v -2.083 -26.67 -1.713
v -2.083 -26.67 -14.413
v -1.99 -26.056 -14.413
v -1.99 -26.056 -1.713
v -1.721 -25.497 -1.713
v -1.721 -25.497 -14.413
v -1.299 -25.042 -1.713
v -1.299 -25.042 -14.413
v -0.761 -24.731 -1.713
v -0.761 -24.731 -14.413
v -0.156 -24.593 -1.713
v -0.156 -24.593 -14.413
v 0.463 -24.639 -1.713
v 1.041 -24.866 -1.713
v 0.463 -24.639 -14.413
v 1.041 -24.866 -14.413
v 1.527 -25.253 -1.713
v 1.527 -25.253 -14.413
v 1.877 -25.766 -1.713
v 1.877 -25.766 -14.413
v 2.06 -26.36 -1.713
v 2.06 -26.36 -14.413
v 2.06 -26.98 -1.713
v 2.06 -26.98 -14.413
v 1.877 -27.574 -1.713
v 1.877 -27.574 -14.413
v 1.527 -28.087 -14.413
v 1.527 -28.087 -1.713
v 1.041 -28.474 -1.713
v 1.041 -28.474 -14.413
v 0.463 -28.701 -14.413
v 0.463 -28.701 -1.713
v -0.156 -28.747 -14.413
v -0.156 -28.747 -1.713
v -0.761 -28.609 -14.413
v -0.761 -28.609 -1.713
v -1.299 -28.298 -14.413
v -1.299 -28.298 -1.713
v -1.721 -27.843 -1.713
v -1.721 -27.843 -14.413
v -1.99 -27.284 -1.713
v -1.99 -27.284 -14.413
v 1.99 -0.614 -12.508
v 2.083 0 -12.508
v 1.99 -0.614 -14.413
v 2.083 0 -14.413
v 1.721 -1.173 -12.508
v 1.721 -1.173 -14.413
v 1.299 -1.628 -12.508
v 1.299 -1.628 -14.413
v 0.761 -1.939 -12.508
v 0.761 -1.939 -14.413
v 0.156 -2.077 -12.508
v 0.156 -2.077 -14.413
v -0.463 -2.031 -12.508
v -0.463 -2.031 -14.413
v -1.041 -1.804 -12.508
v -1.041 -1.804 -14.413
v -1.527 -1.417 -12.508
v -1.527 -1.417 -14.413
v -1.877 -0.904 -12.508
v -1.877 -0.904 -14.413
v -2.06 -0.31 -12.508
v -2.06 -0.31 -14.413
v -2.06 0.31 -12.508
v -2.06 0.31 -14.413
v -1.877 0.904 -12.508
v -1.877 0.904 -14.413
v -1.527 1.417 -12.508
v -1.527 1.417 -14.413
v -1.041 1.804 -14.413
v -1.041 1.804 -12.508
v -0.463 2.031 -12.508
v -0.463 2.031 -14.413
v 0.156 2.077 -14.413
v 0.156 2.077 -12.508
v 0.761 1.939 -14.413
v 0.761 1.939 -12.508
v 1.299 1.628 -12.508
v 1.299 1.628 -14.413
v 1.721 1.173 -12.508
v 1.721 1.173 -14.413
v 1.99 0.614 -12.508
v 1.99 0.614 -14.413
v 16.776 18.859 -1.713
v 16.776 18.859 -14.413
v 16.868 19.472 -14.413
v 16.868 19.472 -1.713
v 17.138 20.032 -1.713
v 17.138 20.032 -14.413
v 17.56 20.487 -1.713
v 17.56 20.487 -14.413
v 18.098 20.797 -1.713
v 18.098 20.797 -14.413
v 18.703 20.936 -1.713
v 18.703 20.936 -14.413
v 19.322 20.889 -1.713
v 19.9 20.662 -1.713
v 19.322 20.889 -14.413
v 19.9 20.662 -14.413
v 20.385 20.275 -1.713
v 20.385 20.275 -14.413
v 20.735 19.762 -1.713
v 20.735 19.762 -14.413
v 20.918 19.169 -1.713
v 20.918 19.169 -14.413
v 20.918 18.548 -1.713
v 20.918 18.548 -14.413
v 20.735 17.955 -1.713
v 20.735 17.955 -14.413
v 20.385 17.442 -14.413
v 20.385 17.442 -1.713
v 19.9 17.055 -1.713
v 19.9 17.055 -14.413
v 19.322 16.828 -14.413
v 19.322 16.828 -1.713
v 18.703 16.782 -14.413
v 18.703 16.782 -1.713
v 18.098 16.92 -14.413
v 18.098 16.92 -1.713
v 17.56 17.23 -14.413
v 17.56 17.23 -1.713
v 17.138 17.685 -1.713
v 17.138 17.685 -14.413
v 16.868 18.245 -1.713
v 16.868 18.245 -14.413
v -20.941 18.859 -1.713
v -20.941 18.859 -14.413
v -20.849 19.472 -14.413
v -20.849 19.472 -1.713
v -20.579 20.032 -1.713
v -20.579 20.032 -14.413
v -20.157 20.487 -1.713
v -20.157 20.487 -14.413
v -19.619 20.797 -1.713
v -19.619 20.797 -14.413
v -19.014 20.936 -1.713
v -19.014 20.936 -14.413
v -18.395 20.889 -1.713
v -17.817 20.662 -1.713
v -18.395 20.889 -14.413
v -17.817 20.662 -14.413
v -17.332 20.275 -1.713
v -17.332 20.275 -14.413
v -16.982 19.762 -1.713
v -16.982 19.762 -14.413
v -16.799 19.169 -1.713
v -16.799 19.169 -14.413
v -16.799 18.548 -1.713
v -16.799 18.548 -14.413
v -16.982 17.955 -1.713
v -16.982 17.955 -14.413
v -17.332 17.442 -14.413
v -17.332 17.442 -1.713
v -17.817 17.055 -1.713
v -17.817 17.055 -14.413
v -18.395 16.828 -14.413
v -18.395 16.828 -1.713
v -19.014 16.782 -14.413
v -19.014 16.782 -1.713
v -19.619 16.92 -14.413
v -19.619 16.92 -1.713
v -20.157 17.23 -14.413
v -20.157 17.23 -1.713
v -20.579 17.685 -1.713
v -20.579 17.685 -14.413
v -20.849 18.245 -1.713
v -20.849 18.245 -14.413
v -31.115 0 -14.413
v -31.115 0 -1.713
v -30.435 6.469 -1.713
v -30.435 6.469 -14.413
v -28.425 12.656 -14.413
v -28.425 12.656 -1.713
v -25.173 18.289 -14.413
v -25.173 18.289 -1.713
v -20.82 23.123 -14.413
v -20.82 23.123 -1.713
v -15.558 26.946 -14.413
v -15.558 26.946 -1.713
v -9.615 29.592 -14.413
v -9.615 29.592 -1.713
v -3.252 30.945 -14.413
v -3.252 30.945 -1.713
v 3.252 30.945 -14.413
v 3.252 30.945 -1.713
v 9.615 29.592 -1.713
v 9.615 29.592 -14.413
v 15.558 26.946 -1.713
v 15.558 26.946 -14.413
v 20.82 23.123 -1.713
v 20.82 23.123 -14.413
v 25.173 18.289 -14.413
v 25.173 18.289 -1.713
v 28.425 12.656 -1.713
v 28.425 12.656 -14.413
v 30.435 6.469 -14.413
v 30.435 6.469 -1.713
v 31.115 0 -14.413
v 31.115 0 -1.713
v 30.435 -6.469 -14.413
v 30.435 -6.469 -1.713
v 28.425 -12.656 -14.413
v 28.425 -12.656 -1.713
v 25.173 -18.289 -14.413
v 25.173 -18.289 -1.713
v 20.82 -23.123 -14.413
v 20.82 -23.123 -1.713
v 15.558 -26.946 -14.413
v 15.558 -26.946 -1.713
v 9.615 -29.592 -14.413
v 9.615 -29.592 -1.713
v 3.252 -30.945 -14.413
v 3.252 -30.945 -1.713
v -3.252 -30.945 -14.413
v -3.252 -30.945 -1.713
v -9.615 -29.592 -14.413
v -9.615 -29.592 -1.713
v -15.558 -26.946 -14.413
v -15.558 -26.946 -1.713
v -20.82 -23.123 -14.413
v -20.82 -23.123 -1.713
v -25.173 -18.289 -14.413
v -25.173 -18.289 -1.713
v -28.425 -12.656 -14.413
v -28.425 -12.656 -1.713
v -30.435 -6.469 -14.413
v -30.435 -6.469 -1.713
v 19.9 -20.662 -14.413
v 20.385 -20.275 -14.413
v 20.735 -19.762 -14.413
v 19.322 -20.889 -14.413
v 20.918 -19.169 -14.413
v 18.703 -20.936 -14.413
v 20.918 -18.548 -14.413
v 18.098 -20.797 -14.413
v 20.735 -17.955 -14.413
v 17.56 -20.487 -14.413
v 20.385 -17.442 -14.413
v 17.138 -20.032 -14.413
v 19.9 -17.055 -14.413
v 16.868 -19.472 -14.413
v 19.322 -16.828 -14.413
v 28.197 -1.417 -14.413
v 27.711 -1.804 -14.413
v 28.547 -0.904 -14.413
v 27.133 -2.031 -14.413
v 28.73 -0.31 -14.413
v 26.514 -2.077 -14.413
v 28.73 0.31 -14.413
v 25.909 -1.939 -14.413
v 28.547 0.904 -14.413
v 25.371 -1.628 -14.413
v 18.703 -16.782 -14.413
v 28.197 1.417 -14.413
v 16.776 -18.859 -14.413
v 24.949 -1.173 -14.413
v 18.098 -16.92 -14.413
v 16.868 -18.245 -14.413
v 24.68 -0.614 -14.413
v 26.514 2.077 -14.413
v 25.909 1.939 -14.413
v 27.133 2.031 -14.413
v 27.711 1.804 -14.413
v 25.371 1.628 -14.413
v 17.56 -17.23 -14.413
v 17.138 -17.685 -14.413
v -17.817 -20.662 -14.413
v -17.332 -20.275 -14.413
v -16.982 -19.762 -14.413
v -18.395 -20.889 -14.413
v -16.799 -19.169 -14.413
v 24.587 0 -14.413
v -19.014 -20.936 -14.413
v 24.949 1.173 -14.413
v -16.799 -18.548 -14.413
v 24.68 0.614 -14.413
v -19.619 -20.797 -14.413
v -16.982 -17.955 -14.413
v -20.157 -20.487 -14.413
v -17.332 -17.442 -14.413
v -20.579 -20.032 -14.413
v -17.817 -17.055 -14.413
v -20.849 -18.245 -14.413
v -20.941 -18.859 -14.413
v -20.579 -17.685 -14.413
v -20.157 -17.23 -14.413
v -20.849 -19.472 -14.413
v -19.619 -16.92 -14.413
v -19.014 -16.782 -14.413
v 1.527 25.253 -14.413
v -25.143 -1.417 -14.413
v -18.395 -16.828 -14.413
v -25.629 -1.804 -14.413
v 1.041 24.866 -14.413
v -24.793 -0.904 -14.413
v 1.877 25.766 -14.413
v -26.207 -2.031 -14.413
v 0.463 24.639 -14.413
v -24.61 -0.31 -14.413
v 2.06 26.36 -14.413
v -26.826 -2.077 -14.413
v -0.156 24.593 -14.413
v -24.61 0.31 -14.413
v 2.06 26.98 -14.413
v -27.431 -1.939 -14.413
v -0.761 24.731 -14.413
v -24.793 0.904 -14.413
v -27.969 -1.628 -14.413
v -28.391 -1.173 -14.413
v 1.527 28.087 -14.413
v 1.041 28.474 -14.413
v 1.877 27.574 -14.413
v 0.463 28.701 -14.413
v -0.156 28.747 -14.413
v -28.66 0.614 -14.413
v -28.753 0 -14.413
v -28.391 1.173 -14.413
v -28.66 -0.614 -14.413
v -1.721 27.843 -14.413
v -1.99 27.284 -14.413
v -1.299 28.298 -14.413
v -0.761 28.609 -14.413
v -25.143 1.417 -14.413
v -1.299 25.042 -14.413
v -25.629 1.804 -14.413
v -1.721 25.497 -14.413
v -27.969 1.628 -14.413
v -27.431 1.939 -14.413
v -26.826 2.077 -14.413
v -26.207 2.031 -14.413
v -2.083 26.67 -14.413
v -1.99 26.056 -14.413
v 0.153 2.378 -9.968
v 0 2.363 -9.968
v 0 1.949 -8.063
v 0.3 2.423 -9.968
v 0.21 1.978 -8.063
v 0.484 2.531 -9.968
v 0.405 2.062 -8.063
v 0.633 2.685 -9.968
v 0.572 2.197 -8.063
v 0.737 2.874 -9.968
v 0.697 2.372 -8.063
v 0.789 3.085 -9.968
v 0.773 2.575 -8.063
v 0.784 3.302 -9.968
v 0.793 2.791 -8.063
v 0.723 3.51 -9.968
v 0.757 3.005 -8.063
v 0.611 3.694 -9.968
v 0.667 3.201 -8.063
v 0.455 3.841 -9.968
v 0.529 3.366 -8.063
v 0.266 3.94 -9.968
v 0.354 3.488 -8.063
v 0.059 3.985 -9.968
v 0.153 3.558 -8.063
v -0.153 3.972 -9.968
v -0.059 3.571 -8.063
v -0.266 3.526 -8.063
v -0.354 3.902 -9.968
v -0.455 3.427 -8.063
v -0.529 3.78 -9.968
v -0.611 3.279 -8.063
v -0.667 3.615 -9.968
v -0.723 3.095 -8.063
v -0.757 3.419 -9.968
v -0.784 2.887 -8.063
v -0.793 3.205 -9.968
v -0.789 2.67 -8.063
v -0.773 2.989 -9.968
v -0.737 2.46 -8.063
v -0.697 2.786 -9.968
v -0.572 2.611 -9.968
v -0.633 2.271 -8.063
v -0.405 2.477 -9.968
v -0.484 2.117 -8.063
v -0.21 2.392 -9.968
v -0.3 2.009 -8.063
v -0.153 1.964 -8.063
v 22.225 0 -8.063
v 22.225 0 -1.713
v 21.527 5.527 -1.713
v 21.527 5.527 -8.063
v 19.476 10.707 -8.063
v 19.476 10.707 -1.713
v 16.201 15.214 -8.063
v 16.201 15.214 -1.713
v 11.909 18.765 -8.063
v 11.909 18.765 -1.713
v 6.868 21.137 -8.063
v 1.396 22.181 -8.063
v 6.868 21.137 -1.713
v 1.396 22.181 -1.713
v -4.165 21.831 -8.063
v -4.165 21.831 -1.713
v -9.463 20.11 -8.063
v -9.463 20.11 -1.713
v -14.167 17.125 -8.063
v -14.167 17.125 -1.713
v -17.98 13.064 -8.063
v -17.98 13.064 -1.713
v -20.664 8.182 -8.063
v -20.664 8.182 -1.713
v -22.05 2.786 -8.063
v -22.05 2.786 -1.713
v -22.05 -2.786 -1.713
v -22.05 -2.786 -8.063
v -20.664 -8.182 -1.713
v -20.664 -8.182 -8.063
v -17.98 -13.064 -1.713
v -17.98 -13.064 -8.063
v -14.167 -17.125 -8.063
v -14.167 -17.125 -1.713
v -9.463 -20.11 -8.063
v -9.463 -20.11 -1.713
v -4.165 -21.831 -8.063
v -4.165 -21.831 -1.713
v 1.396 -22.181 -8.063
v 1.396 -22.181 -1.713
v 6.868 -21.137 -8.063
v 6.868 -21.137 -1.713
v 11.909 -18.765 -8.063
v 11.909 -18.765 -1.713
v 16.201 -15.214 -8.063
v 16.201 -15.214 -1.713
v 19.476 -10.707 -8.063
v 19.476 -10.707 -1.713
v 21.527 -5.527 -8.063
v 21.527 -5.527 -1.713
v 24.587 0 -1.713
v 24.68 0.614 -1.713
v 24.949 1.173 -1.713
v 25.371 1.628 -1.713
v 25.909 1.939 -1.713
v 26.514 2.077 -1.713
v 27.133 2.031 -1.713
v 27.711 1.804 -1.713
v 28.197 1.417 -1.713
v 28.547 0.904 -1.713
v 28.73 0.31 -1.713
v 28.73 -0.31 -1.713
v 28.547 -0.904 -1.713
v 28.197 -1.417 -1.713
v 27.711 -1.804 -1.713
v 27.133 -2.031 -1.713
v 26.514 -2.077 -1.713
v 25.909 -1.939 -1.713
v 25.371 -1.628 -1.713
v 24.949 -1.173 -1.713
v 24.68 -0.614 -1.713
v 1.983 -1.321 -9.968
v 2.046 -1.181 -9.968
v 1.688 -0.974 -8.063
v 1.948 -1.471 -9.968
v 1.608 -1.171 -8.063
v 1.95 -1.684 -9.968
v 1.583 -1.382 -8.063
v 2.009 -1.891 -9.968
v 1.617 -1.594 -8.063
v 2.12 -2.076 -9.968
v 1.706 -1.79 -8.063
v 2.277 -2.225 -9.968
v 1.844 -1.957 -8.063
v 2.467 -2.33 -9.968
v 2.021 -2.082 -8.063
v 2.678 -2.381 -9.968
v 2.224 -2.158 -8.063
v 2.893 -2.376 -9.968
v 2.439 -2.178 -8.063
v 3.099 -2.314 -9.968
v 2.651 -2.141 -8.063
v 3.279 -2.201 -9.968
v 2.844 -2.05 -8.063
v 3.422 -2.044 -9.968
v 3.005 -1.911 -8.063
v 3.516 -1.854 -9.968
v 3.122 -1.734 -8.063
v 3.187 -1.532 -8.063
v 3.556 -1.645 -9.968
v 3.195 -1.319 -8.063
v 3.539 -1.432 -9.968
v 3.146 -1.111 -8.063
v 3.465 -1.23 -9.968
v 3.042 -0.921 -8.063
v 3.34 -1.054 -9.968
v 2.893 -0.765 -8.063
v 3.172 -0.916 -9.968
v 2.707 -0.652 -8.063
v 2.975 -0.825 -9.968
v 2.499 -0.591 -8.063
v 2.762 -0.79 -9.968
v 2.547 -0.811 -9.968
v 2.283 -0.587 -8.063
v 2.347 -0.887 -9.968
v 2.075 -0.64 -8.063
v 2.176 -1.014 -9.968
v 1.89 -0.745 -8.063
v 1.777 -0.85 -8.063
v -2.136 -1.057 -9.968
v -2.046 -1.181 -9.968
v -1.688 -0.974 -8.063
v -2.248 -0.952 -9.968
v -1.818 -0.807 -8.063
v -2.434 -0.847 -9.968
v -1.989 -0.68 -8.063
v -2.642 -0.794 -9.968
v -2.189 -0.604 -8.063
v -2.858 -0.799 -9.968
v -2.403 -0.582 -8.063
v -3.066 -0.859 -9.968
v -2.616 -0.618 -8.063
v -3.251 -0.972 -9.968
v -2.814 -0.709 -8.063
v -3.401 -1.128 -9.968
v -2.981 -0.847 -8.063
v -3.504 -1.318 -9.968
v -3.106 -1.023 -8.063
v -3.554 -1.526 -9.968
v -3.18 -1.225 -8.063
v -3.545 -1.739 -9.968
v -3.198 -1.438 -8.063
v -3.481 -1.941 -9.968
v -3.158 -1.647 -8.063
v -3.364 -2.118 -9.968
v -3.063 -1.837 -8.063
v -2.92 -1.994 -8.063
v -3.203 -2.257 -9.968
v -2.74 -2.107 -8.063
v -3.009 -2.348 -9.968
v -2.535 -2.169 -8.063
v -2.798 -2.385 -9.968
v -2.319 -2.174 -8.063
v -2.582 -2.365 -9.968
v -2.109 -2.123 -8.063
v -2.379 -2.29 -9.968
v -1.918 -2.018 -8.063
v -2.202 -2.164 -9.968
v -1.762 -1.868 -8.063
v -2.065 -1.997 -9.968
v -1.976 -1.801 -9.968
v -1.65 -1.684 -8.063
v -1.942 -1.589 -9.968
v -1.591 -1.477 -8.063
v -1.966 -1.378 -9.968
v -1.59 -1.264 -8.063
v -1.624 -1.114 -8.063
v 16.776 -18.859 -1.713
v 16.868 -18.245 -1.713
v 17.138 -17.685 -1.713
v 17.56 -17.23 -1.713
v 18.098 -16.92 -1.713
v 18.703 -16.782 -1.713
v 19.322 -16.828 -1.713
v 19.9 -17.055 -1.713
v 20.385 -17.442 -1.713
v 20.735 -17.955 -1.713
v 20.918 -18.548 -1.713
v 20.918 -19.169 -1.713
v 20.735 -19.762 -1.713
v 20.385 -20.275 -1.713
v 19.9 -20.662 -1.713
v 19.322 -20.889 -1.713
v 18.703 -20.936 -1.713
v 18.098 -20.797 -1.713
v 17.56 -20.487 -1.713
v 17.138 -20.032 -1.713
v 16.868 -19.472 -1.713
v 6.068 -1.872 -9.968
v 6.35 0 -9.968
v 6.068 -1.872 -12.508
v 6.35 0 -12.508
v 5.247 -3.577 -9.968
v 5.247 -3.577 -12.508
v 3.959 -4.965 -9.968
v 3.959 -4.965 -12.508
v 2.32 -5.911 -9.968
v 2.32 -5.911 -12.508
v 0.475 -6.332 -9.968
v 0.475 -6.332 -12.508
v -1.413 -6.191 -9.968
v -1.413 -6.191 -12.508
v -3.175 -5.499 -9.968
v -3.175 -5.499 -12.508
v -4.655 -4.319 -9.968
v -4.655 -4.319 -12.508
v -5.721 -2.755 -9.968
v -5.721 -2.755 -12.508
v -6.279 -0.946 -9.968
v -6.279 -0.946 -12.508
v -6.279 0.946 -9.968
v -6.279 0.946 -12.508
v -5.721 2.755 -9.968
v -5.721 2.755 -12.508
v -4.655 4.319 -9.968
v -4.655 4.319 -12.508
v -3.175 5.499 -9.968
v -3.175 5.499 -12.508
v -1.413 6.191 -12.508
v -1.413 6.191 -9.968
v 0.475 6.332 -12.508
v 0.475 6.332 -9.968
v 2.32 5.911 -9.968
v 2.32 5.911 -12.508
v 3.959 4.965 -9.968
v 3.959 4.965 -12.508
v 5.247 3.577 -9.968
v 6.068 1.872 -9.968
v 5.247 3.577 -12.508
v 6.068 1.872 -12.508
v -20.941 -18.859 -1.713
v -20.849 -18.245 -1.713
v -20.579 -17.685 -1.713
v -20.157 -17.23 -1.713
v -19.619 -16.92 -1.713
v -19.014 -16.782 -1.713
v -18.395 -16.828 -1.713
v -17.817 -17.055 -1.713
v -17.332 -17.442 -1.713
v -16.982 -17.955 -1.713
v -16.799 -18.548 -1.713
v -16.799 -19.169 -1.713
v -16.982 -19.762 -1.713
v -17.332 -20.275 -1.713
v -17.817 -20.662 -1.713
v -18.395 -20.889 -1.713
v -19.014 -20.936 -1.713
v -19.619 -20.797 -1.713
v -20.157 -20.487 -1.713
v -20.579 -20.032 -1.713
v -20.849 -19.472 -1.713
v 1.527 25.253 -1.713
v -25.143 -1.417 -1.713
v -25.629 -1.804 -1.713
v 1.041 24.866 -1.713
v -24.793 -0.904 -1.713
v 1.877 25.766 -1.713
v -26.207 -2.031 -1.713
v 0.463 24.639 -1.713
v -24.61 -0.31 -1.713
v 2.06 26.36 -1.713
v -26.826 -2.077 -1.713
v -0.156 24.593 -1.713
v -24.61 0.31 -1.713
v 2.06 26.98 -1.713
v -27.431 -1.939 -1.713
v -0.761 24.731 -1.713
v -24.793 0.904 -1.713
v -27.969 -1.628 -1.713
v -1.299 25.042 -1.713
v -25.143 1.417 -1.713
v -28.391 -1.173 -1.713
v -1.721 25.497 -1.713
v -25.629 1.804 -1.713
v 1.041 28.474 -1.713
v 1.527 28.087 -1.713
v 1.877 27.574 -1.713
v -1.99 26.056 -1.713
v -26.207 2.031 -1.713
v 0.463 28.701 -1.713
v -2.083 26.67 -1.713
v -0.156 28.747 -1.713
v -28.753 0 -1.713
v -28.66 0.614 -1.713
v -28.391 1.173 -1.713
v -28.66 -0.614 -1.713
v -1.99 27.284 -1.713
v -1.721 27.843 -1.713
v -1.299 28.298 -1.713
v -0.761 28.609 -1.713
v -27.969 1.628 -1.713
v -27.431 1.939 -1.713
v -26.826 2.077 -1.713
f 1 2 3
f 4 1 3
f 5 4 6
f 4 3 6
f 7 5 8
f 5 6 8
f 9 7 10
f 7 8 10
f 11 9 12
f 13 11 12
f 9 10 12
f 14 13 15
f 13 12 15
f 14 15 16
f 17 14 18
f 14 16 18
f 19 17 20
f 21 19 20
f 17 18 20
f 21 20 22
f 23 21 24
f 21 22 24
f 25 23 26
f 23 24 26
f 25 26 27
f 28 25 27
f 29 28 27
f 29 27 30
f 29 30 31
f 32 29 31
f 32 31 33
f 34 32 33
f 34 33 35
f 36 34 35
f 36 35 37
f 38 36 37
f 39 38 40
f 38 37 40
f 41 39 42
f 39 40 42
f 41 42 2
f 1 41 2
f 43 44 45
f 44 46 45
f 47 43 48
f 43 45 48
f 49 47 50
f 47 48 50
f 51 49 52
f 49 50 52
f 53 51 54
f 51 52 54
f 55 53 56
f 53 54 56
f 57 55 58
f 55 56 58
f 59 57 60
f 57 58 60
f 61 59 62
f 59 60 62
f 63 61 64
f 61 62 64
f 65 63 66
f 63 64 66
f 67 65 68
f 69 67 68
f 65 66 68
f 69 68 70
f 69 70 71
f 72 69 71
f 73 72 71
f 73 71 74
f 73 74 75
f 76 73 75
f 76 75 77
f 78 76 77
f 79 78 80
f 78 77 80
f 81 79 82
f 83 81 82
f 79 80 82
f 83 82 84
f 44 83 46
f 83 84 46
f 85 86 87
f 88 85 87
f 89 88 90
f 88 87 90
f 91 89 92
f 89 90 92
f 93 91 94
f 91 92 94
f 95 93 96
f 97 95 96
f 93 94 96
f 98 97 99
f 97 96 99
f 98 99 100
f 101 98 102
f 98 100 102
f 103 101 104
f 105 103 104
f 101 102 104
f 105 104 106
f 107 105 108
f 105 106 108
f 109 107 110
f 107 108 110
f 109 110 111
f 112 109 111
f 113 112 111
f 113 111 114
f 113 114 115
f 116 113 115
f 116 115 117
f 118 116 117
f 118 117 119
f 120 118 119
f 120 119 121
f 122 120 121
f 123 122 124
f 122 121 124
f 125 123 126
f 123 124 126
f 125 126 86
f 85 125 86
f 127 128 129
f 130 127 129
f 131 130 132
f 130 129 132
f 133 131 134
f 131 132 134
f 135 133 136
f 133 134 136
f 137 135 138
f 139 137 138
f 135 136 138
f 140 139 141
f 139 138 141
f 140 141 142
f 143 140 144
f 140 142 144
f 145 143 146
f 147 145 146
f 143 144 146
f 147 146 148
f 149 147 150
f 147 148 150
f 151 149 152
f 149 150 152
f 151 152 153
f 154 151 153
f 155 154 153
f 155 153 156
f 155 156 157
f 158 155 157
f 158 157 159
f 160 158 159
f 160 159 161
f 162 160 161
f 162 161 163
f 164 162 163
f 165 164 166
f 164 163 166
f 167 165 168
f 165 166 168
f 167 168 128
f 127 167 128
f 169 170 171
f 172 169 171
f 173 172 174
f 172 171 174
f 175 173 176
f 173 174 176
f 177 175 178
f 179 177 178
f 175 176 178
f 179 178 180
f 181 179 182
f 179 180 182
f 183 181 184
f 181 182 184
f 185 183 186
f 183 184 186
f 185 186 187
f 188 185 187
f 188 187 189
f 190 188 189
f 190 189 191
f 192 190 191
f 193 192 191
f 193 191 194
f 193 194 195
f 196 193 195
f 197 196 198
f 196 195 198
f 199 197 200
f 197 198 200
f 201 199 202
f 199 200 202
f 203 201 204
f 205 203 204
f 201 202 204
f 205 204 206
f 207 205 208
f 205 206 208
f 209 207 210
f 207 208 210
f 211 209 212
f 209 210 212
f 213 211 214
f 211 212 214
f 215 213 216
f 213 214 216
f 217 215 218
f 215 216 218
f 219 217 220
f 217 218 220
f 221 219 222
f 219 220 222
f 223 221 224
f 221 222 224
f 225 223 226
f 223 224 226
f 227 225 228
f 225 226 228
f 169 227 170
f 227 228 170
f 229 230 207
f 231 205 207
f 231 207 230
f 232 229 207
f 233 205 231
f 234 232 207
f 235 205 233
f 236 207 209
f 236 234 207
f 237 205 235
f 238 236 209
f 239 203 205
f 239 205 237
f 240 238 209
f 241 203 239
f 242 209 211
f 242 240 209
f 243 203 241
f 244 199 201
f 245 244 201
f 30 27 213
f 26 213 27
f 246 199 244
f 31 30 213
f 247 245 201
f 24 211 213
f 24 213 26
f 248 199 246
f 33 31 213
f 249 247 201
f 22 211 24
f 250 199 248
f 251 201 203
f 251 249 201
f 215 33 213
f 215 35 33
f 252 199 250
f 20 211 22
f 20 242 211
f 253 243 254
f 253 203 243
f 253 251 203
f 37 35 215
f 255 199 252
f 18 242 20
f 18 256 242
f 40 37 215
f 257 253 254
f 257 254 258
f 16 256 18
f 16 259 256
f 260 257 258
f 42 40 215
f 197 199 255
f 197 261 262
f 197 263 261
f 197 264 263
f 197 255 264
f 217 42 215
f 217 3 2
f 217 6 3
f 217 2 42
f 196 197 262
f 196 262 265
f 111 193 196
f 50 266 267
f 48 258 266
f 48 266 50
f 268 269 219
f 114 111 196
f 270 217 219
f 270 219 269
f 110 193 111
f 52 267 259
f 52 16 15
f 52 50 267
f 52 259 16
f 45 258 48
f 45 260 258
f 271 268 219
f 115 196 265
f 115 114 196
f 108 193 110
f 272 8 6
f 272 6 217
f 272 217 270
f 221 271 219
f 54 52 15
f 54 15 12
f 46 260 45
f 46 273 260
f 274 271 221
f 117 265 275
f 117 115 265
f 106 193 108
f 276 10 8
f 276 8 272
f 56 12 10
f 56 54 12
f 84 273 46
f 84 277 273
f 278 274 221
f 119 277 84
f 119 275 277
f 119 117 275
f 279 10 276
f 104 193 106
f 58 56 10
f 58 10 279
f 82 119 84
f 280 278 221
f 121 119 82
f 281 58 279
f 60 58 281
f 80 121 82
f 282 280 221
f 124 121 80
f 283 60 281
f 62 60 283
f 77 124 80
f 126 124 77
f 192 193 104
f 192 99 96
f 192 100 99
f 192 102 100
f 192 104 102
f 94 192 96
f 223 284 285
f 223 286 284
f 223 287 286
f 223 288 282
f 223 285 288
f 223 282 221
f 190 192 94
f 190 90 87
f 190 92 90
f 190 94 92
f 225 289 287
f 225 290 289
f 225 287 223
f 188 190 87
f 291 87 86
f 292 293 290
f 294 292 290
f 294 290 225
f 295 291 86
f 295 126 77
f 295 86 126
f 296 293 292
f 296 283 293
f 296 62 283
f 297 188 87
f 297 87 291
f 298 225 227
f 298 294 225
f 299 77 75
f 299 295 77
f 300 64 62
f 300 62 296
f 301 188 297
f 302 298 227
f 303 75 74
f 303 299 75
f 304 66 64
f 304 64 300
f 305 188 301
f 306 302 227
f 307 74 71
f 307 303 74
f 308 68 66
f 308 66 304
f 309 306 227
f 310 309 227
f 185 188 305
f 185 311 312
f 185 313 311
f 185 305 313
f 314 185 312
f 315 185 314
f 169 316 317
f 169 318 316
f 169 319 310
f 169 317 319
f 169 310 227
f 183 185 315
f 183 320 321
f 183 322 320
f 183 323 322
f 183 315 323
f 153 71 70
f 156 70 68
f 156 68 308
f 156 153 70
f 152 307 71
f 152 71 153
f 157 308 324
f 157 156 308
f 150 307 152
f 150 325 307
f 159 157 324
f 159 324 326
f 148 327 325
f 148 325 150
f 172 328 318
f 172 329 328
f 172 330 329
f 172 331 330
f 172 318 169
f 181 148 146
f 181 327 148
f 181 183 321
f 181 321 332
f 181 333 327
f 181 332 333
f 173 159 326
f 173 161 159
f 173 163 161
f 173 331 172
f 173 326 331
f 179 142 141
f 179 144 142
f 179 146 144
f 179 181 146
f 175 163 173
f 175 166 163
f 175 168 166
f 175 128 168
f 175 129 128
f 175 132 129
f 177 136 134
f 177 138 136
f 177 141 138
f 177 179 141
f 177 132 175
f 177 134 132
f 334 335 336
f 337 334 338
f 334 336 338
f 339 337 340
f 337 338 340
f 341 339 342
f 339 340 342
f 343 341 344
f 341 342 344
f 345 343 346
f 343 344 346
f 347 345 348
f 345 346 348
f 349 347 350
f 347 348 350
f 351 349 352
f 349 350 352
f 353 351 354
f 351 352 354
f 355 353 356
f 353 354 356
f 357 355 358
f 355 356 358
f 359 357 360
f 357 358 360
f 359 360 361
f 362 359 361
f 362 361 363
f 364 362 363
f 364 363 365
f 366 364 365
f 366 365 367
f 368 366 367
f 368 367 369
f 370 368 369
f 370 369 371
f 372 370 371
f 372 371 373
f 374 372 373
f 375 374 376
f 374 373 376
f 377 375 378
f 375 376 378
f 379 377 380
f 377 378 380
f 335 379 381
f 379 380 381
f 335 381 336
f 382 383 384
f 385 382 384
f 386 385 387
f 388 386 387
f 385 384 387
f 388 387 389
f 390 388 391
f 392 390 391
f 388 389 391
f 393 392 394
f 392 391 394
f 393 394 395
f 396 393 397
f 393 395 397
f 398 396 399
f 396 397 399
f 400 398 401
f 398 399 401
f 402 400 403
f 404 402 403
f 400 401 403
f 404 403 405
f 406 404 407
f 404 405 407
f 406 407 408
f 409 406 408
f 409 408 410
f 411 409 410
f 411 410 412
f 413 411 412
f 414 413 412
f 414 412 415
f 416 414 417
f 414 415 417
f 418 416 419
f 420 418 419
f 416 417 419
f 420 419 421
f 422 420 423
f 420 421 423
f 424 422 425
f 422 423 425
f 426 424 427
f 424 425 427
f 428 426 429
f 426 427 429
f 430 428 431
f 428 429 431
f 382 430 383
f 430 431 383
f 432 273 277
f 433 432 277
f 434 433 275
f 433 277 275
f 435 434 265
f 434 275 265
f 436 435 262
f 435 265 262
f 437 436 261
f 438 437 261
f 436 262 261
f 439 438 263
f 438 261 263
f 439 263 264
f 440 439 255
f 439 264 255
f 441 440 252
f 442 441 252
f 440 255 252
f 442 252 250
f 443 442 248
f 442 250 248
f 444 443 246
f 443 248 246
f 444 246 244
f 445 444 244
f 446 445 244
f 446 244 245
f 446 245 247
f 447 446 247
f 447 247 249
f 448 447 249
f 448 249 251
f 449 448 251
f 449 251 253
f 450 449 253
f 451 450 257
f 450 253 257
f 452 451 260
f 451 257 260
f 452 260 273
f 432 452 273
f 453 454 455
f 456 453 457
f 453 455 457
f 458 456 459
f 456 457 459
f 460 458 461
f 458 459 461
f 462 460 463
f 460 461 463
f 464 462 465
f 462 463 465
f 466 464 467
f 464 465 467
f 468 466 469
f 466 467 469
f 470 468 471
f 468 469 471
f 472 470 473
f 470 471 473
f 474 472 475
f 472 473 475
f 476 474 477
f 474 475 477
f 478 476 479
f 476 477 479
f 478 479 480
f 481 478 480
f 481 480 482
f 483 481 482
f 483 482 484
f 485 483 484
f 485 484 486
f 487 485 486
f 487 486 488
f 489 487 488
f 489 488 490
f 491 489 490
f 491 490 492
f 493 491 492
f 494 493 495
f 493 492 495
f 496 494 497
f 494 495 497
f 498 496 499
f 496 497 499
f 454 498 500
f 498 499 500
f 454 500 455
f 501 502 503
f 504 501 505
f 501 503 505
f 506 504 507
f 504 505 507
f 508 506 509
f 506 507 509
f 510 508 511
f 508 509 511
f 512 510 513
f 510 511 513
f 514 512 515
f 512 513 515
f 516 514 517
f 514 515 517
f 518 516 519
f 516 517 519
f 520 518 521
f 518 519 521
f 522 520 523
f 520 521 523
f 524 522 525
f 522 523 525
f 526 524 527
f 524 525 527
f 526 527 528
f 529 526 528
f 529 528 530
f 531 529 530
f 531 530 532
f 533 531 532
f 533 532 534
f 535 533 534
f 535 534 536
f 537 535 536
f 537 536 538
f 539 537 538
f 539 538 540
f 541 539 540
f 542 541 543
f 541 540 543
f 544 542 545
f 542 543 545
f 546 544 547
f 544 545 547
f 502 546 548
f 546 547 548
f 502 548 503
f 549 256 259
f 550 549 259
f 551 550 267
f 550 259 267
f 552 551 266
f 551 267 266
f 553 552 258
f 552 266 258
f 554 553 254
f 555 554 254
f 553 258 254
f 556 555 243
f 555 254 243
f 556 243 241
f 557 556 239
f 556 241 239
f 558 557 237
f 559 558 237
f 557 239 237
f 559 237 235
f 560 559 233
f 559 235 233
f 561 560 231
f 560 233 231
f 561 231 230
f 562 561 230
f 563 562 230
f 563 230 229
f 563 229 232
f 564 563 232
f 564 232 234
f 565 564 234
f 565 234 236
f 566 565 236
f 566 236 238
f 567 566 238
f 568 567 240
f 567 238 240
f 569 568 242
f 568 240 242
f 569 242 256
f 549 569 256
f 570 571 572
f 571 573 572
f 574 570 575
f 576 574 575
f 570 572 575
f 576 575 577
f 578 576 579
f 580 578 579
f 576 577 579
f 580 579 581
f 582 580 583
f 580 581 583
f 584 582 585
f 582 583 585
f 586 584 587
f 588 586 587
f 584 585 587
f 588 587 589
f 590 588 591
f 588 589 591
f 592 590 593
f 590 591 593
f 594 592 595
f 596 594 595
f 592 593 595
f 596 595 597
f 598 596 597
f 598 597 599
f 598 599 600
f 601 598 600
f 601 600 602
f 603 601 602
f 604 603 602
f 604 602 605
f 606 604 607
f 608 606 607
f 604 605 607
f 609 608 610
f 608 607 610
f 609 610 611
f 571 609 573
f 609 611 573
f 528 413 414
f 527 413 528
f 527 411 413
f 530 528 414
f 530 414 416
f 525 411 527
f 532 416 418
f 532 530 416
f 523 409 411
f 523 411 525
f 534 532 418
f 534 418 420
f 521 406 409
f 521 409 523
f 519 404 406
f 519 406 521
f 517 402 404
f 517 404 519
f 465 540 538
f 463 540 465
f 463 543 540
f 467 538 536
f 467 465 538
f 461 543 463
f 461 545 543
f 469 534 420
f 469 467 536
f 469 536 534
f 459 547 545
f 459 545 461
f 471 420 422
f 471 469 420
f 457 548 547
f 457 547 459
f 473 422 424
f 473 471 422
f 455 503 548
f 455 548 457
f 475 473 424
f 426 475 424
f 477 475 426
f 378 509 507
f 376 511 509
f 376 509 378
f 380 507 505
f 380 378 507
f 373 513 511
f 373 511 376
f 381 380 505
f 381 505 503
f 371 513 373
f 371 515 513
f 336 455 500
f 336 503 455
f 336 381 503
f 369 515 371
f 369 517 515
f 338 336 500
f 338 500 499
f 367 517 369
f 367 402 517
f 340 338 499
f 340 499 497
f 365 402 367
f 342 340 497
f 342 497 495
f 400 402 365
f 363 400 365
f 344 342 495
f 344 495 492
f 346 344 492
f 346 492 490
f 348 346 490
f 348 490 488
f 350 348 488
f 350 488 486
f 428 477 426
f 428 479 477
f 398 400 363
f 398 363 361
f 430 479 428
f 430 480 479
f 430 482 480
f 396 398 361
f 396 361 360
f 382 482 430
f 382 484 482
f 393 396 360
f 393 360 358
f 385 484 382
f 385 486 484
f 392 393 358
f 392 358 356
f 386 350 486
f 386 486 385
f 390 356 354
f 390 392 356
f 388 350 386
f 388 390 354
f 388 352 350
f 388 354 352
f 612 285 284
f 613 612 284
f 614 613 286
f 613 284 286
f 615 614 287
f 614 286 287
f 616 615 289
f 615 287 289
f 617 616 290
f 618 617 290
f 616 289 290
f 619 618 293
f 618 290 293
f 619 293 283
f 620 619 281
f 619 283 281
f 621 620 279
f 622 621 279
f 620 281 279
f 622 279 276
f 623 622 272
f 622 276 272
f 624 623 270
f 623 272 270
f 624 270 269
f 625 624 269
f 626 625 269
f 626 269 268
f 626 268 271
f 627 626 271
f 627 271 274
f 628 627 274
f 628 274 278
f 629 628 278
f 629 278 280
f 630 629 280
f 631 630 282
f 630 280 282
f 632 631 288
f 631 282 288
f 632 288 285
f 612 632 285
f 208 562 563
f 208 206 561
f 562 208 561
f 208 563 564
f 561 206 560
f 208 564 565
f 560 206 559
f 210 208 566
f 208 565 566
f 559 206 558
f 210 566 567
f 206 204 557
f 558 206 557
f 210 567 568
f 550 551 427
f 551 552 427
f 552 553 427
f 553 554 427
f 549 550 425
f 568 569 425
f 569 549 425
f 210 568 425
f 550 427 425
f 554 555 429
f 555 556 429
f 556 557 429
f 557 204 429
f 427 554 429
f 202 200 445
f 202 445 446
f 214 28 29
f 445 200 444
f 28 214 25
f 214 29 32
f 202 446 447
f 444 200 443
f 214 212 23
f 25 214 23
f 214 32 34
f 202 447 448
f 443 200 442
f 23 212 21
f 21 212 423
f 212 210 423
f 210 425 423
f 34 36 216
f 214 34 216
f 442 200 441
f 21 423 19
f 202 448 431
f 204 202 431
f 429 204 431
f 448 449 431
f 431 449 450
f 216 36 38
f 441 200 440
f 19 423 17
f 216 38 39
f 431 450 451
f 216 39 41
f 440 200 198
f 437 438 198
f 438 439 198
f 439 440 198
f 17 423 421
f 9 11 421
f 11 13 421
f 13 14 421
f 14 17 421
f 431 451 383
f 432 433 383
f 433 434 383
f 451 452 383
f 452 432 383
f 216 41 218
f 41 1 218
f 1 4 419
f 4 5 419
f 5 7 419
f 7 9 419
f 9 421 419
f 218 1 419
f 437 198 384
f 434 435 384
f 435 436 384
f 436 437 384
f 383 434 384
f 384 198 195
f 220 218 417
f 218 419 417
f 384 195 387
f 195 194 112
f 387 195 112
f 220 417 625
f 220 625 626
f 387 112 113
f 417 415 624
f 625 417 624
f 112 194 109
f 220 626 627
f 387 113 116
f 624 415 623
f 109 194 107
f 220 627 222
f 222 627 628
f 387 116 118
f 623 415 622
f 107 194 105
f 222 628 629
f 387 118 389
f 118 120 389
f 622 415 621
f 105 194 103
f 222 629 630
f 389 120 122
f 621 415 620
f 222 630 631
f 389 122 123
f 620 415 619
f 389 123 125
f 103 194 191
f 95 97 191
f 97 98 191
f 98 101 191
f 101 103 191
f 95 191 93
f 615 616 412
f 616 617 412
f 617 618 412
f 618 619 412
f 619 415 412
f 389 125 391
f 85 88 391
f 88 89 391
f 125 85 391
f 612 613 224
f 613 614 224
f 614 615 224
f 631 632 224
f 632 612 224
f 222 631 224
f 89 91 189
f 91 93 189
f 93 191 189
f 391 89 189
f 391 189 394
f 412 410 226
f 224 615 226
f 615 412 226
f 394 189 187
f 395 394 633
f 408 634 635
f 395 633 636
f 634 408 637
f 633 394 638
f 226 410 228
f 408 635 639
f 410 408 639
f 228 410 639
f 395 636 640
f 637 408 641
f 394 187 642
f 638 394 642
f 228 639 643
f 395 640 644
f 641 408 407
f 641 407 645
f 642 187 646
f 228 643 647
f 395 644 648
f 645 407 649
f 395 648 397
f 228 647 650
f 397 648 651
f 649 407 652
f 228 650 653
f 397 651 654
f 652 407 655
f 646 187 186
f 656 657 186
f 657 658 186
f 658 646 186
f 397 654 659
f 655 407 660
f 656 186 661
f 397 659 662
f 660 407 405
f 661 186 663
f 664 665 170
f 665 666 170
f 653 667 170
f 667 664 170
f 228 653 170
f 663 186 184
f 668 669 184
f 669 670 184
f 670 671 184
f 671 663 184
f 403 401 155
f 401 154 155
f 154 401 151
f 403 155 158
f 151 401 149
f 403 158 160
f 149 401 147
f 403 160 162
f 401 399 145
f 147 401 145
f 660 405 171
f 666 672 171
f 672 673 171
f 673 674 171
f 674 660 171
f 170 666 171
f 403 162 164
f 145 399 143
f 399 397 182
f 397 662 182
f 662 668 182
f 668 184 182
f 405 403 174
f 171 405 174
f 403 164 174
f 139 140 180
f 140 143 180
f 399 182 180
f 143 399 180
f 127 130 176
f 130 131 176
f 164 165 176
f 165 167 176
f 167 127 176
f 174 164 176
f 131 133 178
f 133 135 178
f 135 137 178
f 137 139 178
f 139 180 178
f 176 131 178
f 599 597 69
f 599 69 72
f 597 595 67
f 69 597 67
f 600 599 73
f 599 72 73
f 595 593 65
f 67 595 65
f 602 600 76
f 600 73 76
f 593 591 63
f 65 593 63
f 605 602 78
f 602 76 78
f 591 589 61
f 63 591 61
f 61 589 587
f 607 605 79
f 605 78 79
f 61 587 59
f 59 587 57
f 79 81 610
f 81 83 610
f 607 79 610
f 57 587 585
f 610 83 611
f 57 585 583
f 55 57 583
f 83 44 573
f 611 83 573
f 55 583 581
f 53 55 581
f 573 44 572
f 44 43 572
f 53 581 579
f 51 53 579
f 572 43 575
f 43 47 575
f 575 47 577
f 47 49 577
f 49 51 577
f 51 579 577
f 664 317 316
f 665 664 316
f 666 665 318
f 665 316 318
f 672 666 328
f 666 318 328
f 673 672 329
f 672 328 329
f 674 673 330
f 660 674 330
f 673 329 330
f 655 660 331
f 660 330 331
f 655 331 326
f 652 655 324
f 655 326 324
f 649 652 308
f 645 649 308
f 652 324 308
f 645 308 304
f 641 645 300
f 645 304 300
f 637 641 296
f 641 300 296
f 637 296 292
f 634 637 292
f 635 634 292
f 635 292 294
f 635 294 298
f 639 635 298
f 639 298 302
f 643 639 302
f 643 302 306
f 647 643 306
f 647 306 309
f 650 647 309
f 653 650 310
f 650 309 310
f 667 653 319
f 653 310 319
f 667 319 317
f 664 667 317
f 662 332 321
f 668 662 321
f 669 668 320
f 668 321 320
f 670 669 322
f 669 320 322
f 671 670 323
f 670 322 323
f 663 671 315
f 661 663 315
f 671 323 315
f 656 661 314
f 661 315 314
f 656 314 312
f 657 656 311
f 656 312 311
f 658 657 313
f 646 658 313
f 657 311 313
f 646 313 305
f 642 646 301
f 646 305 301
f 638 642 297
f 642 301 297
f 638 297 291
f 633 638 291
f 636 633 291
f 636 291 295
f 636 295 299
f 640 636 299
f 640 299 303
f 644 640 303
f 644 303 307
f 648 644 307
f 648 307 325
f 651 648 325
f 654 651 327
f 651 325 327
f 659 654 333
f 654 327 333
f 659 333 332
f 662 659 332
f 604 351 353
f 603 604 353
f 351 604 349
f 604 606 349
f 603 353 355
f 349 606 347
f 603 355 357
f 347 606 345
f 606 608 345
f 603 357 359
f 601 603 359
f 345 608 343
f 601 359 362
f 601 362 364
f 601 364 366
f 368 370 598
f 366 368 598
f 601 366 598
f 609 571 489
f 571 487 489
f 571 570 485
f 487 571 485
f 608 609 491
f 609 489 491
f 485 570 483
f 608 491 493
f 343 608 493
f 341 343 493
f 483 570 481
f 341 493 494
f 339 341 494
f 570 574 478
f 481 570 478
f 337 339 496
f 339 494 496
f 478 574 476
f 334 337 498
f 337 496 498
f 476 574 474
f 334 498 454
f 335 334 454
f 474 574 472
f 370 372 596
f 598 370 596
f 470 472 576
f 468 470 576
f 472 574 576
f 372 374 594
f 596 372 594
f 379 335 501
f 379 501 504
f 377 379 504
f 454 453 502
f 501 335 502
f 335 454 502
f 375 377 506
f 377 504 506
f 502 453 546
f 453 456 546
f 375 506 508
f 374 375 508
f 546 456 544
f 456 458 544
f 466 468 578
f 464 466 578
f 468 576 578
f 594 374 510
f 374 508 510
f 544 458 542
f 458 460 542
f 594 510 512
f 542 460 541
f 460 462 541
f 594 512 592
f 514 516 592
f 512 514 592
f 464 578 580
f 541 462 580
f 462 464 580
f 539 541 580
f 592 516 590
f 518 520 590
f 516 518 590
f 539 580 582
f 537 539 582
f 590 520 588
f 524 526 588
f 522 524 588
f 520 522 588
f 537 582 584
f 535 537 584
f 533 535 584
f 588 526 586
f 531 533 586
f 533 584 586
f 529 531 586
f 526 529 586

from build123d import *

# Parameters (mm, degrees)
SKETCH2_R           = 31.115
BOSS_EXTRUDE1_DEPTH = 12.7
SKETCH3_R           = 2.0828
CUT_EXTRUDE3_DEPTH  = 12.7
SKETCH4_R           = 22.225
CUT_EXTRUDE2_DEPTH  = 6.35
CUT_EXTRUDE4_REACH  = 49.95
SKETCH8_R           = 0.79375
CIRPATTERN1_COUNT   = 3


with BuildPart() as part:
    # Sketch2 → Boss-Extrude1 (new body)
    with BuildSketch(Plane(origin=(0, 0, -1.71308935), x_dir=(-1, 0, 0), z_dir=(0, 0, -1))):
        Circle(SKETCH2_R)
    extrude(amount=BOSS_EXTRUDE1_DEPTH)

    # Sketch3 → Cut-Extrude3 (cut)
    with BuildSketch(Plane(origin=(0, 0, -14.41308935), x_dir=(-1, 0, 0), z_dir=(0, 0, -1))):
        with Locations((0, 26.67)):
            Circle(SKETCH3_R)
        with Locations((18.858537854, 18.858537854)):
            Circle(SKETCH3_R)
        with Locations((26.67, 0)):
            Circle(SKETCH3_R)
        with Locations((18.858537854, -18.858537854)):
            Circle(SKETCH3_R)
        with Locations((0, -26.67)):
            Circle(SKETCH3_R)
        with Locations((-18.858537854, -18.858537854)):
            Circle(SKETCH3_R)
        with Locations((-26.67, 0)):
            Circle(SKETCH3_R)
        with Locations((-18.858537854, 18.858537854)):
            Circle(SKETCH3_R)
    extrude(amount=-CUT_EXTRUDE3_DEPTH, mode=Mode.SUBTRACT)

    # Sketch4 → Cut-Extrude2 (cut)
    with BuildSketch(Plane.XY.offset(-1.71308935)):
        Circle(SKETCH4_R)
    extrude(amount=-CUT_EXTRUDE2_DEPTH, mode=Mode.SUBTRACT)

    # Sketch6 → Cut-Revolve2 (revolve, cut)
    with BuildSketch(Plane(origin=(0, 0, 0), x_dir=(0, 0, -1), z_dir=(1, 0, 0)), mode=Mode.PRIVATE) as cut_revolve2_sk:
        Polygon((9.96808935, 0), (9.96808935, 6.35), (12.50808935, 6.35), (12.50808935, 2.0828), (14.41308935, 2.0828), (14.41308935, 0), align=None)
    revolve(cut_revolve2_sk.sketch.rotate(Axis((0, 0, 69.036833432), (0, 0, -1)), 90), axis=Axis((0, 0, 69.036833432), (0, 0, -1)), mode=Mode.SUBTRACT)

    # Cut-Extrude4: up to this plane
    cut_extrude4_end = Plane(origin=(0, 0, -9.96808935), z_dir=(0, 0, -1))
    # Sketch8 → Cut-Extrude4 (cut, up to the surface)
    with BuildSketch(Plane(origin=(0, 0, 4.63691065), x_dir=(1, 0, 0), z_dir=(0, -0.21242964433104367, 0.9771763639228009)), mode=Mode.PRIVATE) as cut_extrude4_sk1:
        with Locations(Location((0, 0, 0), (0, 0, 270))):
            Circle(SKETCH8_R)
    cut_extrude4_tool1 = split(extrude(cut_extrude4_sk1.sketch, amount=-CUT_EXTRUDE4_REACH, mode=Mode.PRIVATE), bisect_by=cut_extrude4_end, keep=Keep.BOTH, mode=Mode.PRIVATE)
    cut_extrude4 = cut_extrude4_tool1.solids().sort_by_distance((0, 0, 4.636911))[0]
    add(cut_extrude4, mode=Mode.SUBTRACT)

    # CirPattern1: Cut-Extrude4 ×3 about axis
    cirpattern1_axis = Axis((0, 0, -1.71308935), (0, 0, 1))
    for i in range(1, CIRPATTERN1_COUNT):
        add(cut_extrude4.rotate(cirpattern1_axis, i * 360 / CIRPATTERN1_COUNT), mode=Mode.SUBTRACT)


solid = part.part
